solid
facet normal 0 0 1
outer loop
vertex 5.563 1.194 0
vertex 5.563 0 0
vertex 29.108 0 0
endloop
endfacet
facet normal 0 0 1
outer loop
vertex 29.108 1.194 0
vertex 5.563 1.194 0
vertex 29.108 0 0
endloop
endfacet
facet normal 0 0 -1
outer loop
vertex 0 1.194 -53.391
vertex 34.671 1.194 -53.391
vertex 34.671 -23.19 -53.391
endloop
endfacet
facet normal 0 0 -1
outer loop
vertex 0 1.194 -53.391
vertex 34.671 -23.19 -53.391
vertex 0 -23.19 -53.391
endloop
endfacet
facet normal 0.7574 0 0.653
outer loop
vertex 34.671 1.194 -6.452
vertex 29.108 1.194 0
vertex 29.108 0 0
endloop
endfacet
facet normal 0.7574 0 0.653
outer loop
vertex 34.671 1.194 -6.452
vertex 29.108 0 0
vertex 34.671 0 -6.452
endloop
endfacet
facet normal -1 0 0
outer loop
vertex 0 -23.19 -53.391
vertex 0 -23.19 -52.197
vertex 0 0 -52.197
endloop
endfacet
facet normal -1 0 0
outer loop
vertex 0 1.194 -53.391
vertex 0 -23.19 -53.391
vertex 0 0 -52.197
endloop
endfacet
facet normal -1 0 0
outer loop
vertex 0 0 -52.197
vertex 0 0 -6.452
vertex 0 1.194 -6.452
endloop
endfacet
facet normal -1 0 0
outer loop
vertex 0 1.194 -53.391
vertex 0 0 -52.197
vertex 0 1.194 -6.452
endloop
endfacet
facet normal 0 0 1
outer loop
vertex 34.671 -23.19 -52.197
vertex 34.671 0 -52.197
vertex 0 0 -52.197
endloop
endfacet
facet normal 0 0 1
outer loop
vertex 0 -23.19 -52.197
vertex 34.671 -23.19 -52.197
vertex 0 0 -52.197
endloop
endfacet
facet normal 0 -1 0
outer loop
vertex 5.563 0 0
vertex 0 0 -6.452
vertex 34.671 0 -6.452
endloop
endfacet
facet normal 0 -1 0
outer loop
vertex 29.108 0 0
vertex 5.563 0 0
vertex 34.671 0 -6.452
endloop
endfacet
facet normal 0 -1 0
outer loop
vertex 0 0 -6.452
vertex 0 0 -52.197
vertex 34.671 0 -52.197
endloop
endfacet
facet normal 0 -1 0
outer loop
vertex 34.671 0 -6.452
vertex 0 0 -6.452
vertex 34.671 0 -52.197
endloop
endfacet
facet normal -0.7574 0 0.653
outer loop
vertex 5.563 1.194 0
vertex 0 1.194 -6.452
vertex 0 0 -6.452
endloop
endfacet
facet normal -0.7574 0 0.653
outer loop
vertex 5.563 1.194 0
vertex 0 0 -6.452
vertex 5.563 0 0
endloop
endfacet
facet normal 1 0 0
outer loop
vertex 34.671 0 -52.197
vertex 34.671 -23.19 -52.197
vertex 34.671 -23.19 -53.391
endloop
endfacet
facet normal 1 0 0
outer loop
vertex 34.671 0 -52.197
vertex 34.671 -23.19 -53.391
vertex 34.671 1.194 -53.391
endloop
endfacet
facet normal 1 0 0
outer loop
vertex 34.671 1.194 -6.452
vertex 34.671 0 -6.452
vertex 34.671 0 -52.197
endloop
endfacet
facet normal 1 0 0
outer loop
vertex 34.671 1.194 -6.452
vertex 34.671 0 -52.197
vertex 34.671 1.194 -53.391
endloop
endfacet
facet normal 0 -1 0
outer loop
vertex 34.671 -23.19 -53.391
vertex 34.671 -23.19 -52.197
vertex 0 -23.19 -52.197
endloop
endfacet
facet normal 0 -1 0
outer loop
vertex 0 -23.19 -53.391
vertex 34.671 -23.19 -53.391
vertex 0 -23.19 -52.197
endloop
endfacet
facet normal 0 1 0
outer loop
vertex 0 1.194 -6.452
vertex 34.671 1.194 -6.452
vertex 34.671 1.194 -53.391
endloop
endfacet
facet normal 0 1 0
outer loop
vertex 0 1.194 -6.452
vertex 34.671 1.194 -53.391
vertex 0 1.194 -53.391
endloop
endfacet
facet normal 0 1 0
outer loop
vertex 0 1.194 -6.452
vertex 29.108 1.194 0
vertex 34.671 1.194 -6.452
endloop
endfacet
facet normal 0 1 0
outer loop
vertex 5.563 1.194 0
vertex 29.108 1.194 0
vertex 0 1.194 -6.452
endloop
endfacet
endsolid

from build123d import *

# Parameters (mm, degrees)
SKETCH1_W               = 34.671
SKETCH1_H               = 52.197
BOSS_EXTRUDE1_DEPTH     = 1.1938
SKETCH3_W               = 34.671
SKETCH3_H               = 24.384
BOSS_EXTRUDE2_DEPTH     = 1.1938
CUT_EXTRUDE1_DEPTH      = 68.752794346
CUT_EXTRUDE1_DEPTH_BACK = 68.752794346


with BuildPart() as part:
    # Sketch1 → Boss-Extrude1 (new body)
    with BuildSketch(Plane(origin=(0, 0, 0), x_dir=(1, 0, 0), z_dir=(0, 1, 0))):
        with Locations((17.3355, 26.0985)):
            Rectangle(SKETCH1_W, SKETCH1_H)
    extrude(amount=BOSS_EXTRUDE1_DEPTH)

    # Sketch3 → Boss-Extrude2 (add)
    with BuildSketch(Plane(origin=(0, 0, -52.197), x_dir=(-1, 0, 0), z_dir=(0, 0, -1))):
        with Locations((-17.3355, -10.9982)):
            Rectangle(SKETCH3_W, SKETCH3_H)
    extrude(amount=BOSS_EXTRUDE2_DEPTH)

    # Sketch4 → Cut-Extrude1 (cut, two sides: drawn at the far end of the back side and taken through both)
    with BuildSketch(Plane(origin=(0, 0, 0), x_dir=(-1, 0, 0), z_dir=(0, -1, 0)).offset(-CUT_EXTRUDE1_DEPTH_BACK)):
        Polygon((0, 6.4516), (-5.5626, 0), (0, 0), align=None)
        Polygon((-29.1084, 0), (-34.671, 6.4516), (-34.671, 0), align=None)
    extrude(amount=CUT_EXTRUDE1_DEPTH + CUT_EXTRUDE1_DEPTH_BACK, mode=Mode.SUBTRACT)


solid = part.part
